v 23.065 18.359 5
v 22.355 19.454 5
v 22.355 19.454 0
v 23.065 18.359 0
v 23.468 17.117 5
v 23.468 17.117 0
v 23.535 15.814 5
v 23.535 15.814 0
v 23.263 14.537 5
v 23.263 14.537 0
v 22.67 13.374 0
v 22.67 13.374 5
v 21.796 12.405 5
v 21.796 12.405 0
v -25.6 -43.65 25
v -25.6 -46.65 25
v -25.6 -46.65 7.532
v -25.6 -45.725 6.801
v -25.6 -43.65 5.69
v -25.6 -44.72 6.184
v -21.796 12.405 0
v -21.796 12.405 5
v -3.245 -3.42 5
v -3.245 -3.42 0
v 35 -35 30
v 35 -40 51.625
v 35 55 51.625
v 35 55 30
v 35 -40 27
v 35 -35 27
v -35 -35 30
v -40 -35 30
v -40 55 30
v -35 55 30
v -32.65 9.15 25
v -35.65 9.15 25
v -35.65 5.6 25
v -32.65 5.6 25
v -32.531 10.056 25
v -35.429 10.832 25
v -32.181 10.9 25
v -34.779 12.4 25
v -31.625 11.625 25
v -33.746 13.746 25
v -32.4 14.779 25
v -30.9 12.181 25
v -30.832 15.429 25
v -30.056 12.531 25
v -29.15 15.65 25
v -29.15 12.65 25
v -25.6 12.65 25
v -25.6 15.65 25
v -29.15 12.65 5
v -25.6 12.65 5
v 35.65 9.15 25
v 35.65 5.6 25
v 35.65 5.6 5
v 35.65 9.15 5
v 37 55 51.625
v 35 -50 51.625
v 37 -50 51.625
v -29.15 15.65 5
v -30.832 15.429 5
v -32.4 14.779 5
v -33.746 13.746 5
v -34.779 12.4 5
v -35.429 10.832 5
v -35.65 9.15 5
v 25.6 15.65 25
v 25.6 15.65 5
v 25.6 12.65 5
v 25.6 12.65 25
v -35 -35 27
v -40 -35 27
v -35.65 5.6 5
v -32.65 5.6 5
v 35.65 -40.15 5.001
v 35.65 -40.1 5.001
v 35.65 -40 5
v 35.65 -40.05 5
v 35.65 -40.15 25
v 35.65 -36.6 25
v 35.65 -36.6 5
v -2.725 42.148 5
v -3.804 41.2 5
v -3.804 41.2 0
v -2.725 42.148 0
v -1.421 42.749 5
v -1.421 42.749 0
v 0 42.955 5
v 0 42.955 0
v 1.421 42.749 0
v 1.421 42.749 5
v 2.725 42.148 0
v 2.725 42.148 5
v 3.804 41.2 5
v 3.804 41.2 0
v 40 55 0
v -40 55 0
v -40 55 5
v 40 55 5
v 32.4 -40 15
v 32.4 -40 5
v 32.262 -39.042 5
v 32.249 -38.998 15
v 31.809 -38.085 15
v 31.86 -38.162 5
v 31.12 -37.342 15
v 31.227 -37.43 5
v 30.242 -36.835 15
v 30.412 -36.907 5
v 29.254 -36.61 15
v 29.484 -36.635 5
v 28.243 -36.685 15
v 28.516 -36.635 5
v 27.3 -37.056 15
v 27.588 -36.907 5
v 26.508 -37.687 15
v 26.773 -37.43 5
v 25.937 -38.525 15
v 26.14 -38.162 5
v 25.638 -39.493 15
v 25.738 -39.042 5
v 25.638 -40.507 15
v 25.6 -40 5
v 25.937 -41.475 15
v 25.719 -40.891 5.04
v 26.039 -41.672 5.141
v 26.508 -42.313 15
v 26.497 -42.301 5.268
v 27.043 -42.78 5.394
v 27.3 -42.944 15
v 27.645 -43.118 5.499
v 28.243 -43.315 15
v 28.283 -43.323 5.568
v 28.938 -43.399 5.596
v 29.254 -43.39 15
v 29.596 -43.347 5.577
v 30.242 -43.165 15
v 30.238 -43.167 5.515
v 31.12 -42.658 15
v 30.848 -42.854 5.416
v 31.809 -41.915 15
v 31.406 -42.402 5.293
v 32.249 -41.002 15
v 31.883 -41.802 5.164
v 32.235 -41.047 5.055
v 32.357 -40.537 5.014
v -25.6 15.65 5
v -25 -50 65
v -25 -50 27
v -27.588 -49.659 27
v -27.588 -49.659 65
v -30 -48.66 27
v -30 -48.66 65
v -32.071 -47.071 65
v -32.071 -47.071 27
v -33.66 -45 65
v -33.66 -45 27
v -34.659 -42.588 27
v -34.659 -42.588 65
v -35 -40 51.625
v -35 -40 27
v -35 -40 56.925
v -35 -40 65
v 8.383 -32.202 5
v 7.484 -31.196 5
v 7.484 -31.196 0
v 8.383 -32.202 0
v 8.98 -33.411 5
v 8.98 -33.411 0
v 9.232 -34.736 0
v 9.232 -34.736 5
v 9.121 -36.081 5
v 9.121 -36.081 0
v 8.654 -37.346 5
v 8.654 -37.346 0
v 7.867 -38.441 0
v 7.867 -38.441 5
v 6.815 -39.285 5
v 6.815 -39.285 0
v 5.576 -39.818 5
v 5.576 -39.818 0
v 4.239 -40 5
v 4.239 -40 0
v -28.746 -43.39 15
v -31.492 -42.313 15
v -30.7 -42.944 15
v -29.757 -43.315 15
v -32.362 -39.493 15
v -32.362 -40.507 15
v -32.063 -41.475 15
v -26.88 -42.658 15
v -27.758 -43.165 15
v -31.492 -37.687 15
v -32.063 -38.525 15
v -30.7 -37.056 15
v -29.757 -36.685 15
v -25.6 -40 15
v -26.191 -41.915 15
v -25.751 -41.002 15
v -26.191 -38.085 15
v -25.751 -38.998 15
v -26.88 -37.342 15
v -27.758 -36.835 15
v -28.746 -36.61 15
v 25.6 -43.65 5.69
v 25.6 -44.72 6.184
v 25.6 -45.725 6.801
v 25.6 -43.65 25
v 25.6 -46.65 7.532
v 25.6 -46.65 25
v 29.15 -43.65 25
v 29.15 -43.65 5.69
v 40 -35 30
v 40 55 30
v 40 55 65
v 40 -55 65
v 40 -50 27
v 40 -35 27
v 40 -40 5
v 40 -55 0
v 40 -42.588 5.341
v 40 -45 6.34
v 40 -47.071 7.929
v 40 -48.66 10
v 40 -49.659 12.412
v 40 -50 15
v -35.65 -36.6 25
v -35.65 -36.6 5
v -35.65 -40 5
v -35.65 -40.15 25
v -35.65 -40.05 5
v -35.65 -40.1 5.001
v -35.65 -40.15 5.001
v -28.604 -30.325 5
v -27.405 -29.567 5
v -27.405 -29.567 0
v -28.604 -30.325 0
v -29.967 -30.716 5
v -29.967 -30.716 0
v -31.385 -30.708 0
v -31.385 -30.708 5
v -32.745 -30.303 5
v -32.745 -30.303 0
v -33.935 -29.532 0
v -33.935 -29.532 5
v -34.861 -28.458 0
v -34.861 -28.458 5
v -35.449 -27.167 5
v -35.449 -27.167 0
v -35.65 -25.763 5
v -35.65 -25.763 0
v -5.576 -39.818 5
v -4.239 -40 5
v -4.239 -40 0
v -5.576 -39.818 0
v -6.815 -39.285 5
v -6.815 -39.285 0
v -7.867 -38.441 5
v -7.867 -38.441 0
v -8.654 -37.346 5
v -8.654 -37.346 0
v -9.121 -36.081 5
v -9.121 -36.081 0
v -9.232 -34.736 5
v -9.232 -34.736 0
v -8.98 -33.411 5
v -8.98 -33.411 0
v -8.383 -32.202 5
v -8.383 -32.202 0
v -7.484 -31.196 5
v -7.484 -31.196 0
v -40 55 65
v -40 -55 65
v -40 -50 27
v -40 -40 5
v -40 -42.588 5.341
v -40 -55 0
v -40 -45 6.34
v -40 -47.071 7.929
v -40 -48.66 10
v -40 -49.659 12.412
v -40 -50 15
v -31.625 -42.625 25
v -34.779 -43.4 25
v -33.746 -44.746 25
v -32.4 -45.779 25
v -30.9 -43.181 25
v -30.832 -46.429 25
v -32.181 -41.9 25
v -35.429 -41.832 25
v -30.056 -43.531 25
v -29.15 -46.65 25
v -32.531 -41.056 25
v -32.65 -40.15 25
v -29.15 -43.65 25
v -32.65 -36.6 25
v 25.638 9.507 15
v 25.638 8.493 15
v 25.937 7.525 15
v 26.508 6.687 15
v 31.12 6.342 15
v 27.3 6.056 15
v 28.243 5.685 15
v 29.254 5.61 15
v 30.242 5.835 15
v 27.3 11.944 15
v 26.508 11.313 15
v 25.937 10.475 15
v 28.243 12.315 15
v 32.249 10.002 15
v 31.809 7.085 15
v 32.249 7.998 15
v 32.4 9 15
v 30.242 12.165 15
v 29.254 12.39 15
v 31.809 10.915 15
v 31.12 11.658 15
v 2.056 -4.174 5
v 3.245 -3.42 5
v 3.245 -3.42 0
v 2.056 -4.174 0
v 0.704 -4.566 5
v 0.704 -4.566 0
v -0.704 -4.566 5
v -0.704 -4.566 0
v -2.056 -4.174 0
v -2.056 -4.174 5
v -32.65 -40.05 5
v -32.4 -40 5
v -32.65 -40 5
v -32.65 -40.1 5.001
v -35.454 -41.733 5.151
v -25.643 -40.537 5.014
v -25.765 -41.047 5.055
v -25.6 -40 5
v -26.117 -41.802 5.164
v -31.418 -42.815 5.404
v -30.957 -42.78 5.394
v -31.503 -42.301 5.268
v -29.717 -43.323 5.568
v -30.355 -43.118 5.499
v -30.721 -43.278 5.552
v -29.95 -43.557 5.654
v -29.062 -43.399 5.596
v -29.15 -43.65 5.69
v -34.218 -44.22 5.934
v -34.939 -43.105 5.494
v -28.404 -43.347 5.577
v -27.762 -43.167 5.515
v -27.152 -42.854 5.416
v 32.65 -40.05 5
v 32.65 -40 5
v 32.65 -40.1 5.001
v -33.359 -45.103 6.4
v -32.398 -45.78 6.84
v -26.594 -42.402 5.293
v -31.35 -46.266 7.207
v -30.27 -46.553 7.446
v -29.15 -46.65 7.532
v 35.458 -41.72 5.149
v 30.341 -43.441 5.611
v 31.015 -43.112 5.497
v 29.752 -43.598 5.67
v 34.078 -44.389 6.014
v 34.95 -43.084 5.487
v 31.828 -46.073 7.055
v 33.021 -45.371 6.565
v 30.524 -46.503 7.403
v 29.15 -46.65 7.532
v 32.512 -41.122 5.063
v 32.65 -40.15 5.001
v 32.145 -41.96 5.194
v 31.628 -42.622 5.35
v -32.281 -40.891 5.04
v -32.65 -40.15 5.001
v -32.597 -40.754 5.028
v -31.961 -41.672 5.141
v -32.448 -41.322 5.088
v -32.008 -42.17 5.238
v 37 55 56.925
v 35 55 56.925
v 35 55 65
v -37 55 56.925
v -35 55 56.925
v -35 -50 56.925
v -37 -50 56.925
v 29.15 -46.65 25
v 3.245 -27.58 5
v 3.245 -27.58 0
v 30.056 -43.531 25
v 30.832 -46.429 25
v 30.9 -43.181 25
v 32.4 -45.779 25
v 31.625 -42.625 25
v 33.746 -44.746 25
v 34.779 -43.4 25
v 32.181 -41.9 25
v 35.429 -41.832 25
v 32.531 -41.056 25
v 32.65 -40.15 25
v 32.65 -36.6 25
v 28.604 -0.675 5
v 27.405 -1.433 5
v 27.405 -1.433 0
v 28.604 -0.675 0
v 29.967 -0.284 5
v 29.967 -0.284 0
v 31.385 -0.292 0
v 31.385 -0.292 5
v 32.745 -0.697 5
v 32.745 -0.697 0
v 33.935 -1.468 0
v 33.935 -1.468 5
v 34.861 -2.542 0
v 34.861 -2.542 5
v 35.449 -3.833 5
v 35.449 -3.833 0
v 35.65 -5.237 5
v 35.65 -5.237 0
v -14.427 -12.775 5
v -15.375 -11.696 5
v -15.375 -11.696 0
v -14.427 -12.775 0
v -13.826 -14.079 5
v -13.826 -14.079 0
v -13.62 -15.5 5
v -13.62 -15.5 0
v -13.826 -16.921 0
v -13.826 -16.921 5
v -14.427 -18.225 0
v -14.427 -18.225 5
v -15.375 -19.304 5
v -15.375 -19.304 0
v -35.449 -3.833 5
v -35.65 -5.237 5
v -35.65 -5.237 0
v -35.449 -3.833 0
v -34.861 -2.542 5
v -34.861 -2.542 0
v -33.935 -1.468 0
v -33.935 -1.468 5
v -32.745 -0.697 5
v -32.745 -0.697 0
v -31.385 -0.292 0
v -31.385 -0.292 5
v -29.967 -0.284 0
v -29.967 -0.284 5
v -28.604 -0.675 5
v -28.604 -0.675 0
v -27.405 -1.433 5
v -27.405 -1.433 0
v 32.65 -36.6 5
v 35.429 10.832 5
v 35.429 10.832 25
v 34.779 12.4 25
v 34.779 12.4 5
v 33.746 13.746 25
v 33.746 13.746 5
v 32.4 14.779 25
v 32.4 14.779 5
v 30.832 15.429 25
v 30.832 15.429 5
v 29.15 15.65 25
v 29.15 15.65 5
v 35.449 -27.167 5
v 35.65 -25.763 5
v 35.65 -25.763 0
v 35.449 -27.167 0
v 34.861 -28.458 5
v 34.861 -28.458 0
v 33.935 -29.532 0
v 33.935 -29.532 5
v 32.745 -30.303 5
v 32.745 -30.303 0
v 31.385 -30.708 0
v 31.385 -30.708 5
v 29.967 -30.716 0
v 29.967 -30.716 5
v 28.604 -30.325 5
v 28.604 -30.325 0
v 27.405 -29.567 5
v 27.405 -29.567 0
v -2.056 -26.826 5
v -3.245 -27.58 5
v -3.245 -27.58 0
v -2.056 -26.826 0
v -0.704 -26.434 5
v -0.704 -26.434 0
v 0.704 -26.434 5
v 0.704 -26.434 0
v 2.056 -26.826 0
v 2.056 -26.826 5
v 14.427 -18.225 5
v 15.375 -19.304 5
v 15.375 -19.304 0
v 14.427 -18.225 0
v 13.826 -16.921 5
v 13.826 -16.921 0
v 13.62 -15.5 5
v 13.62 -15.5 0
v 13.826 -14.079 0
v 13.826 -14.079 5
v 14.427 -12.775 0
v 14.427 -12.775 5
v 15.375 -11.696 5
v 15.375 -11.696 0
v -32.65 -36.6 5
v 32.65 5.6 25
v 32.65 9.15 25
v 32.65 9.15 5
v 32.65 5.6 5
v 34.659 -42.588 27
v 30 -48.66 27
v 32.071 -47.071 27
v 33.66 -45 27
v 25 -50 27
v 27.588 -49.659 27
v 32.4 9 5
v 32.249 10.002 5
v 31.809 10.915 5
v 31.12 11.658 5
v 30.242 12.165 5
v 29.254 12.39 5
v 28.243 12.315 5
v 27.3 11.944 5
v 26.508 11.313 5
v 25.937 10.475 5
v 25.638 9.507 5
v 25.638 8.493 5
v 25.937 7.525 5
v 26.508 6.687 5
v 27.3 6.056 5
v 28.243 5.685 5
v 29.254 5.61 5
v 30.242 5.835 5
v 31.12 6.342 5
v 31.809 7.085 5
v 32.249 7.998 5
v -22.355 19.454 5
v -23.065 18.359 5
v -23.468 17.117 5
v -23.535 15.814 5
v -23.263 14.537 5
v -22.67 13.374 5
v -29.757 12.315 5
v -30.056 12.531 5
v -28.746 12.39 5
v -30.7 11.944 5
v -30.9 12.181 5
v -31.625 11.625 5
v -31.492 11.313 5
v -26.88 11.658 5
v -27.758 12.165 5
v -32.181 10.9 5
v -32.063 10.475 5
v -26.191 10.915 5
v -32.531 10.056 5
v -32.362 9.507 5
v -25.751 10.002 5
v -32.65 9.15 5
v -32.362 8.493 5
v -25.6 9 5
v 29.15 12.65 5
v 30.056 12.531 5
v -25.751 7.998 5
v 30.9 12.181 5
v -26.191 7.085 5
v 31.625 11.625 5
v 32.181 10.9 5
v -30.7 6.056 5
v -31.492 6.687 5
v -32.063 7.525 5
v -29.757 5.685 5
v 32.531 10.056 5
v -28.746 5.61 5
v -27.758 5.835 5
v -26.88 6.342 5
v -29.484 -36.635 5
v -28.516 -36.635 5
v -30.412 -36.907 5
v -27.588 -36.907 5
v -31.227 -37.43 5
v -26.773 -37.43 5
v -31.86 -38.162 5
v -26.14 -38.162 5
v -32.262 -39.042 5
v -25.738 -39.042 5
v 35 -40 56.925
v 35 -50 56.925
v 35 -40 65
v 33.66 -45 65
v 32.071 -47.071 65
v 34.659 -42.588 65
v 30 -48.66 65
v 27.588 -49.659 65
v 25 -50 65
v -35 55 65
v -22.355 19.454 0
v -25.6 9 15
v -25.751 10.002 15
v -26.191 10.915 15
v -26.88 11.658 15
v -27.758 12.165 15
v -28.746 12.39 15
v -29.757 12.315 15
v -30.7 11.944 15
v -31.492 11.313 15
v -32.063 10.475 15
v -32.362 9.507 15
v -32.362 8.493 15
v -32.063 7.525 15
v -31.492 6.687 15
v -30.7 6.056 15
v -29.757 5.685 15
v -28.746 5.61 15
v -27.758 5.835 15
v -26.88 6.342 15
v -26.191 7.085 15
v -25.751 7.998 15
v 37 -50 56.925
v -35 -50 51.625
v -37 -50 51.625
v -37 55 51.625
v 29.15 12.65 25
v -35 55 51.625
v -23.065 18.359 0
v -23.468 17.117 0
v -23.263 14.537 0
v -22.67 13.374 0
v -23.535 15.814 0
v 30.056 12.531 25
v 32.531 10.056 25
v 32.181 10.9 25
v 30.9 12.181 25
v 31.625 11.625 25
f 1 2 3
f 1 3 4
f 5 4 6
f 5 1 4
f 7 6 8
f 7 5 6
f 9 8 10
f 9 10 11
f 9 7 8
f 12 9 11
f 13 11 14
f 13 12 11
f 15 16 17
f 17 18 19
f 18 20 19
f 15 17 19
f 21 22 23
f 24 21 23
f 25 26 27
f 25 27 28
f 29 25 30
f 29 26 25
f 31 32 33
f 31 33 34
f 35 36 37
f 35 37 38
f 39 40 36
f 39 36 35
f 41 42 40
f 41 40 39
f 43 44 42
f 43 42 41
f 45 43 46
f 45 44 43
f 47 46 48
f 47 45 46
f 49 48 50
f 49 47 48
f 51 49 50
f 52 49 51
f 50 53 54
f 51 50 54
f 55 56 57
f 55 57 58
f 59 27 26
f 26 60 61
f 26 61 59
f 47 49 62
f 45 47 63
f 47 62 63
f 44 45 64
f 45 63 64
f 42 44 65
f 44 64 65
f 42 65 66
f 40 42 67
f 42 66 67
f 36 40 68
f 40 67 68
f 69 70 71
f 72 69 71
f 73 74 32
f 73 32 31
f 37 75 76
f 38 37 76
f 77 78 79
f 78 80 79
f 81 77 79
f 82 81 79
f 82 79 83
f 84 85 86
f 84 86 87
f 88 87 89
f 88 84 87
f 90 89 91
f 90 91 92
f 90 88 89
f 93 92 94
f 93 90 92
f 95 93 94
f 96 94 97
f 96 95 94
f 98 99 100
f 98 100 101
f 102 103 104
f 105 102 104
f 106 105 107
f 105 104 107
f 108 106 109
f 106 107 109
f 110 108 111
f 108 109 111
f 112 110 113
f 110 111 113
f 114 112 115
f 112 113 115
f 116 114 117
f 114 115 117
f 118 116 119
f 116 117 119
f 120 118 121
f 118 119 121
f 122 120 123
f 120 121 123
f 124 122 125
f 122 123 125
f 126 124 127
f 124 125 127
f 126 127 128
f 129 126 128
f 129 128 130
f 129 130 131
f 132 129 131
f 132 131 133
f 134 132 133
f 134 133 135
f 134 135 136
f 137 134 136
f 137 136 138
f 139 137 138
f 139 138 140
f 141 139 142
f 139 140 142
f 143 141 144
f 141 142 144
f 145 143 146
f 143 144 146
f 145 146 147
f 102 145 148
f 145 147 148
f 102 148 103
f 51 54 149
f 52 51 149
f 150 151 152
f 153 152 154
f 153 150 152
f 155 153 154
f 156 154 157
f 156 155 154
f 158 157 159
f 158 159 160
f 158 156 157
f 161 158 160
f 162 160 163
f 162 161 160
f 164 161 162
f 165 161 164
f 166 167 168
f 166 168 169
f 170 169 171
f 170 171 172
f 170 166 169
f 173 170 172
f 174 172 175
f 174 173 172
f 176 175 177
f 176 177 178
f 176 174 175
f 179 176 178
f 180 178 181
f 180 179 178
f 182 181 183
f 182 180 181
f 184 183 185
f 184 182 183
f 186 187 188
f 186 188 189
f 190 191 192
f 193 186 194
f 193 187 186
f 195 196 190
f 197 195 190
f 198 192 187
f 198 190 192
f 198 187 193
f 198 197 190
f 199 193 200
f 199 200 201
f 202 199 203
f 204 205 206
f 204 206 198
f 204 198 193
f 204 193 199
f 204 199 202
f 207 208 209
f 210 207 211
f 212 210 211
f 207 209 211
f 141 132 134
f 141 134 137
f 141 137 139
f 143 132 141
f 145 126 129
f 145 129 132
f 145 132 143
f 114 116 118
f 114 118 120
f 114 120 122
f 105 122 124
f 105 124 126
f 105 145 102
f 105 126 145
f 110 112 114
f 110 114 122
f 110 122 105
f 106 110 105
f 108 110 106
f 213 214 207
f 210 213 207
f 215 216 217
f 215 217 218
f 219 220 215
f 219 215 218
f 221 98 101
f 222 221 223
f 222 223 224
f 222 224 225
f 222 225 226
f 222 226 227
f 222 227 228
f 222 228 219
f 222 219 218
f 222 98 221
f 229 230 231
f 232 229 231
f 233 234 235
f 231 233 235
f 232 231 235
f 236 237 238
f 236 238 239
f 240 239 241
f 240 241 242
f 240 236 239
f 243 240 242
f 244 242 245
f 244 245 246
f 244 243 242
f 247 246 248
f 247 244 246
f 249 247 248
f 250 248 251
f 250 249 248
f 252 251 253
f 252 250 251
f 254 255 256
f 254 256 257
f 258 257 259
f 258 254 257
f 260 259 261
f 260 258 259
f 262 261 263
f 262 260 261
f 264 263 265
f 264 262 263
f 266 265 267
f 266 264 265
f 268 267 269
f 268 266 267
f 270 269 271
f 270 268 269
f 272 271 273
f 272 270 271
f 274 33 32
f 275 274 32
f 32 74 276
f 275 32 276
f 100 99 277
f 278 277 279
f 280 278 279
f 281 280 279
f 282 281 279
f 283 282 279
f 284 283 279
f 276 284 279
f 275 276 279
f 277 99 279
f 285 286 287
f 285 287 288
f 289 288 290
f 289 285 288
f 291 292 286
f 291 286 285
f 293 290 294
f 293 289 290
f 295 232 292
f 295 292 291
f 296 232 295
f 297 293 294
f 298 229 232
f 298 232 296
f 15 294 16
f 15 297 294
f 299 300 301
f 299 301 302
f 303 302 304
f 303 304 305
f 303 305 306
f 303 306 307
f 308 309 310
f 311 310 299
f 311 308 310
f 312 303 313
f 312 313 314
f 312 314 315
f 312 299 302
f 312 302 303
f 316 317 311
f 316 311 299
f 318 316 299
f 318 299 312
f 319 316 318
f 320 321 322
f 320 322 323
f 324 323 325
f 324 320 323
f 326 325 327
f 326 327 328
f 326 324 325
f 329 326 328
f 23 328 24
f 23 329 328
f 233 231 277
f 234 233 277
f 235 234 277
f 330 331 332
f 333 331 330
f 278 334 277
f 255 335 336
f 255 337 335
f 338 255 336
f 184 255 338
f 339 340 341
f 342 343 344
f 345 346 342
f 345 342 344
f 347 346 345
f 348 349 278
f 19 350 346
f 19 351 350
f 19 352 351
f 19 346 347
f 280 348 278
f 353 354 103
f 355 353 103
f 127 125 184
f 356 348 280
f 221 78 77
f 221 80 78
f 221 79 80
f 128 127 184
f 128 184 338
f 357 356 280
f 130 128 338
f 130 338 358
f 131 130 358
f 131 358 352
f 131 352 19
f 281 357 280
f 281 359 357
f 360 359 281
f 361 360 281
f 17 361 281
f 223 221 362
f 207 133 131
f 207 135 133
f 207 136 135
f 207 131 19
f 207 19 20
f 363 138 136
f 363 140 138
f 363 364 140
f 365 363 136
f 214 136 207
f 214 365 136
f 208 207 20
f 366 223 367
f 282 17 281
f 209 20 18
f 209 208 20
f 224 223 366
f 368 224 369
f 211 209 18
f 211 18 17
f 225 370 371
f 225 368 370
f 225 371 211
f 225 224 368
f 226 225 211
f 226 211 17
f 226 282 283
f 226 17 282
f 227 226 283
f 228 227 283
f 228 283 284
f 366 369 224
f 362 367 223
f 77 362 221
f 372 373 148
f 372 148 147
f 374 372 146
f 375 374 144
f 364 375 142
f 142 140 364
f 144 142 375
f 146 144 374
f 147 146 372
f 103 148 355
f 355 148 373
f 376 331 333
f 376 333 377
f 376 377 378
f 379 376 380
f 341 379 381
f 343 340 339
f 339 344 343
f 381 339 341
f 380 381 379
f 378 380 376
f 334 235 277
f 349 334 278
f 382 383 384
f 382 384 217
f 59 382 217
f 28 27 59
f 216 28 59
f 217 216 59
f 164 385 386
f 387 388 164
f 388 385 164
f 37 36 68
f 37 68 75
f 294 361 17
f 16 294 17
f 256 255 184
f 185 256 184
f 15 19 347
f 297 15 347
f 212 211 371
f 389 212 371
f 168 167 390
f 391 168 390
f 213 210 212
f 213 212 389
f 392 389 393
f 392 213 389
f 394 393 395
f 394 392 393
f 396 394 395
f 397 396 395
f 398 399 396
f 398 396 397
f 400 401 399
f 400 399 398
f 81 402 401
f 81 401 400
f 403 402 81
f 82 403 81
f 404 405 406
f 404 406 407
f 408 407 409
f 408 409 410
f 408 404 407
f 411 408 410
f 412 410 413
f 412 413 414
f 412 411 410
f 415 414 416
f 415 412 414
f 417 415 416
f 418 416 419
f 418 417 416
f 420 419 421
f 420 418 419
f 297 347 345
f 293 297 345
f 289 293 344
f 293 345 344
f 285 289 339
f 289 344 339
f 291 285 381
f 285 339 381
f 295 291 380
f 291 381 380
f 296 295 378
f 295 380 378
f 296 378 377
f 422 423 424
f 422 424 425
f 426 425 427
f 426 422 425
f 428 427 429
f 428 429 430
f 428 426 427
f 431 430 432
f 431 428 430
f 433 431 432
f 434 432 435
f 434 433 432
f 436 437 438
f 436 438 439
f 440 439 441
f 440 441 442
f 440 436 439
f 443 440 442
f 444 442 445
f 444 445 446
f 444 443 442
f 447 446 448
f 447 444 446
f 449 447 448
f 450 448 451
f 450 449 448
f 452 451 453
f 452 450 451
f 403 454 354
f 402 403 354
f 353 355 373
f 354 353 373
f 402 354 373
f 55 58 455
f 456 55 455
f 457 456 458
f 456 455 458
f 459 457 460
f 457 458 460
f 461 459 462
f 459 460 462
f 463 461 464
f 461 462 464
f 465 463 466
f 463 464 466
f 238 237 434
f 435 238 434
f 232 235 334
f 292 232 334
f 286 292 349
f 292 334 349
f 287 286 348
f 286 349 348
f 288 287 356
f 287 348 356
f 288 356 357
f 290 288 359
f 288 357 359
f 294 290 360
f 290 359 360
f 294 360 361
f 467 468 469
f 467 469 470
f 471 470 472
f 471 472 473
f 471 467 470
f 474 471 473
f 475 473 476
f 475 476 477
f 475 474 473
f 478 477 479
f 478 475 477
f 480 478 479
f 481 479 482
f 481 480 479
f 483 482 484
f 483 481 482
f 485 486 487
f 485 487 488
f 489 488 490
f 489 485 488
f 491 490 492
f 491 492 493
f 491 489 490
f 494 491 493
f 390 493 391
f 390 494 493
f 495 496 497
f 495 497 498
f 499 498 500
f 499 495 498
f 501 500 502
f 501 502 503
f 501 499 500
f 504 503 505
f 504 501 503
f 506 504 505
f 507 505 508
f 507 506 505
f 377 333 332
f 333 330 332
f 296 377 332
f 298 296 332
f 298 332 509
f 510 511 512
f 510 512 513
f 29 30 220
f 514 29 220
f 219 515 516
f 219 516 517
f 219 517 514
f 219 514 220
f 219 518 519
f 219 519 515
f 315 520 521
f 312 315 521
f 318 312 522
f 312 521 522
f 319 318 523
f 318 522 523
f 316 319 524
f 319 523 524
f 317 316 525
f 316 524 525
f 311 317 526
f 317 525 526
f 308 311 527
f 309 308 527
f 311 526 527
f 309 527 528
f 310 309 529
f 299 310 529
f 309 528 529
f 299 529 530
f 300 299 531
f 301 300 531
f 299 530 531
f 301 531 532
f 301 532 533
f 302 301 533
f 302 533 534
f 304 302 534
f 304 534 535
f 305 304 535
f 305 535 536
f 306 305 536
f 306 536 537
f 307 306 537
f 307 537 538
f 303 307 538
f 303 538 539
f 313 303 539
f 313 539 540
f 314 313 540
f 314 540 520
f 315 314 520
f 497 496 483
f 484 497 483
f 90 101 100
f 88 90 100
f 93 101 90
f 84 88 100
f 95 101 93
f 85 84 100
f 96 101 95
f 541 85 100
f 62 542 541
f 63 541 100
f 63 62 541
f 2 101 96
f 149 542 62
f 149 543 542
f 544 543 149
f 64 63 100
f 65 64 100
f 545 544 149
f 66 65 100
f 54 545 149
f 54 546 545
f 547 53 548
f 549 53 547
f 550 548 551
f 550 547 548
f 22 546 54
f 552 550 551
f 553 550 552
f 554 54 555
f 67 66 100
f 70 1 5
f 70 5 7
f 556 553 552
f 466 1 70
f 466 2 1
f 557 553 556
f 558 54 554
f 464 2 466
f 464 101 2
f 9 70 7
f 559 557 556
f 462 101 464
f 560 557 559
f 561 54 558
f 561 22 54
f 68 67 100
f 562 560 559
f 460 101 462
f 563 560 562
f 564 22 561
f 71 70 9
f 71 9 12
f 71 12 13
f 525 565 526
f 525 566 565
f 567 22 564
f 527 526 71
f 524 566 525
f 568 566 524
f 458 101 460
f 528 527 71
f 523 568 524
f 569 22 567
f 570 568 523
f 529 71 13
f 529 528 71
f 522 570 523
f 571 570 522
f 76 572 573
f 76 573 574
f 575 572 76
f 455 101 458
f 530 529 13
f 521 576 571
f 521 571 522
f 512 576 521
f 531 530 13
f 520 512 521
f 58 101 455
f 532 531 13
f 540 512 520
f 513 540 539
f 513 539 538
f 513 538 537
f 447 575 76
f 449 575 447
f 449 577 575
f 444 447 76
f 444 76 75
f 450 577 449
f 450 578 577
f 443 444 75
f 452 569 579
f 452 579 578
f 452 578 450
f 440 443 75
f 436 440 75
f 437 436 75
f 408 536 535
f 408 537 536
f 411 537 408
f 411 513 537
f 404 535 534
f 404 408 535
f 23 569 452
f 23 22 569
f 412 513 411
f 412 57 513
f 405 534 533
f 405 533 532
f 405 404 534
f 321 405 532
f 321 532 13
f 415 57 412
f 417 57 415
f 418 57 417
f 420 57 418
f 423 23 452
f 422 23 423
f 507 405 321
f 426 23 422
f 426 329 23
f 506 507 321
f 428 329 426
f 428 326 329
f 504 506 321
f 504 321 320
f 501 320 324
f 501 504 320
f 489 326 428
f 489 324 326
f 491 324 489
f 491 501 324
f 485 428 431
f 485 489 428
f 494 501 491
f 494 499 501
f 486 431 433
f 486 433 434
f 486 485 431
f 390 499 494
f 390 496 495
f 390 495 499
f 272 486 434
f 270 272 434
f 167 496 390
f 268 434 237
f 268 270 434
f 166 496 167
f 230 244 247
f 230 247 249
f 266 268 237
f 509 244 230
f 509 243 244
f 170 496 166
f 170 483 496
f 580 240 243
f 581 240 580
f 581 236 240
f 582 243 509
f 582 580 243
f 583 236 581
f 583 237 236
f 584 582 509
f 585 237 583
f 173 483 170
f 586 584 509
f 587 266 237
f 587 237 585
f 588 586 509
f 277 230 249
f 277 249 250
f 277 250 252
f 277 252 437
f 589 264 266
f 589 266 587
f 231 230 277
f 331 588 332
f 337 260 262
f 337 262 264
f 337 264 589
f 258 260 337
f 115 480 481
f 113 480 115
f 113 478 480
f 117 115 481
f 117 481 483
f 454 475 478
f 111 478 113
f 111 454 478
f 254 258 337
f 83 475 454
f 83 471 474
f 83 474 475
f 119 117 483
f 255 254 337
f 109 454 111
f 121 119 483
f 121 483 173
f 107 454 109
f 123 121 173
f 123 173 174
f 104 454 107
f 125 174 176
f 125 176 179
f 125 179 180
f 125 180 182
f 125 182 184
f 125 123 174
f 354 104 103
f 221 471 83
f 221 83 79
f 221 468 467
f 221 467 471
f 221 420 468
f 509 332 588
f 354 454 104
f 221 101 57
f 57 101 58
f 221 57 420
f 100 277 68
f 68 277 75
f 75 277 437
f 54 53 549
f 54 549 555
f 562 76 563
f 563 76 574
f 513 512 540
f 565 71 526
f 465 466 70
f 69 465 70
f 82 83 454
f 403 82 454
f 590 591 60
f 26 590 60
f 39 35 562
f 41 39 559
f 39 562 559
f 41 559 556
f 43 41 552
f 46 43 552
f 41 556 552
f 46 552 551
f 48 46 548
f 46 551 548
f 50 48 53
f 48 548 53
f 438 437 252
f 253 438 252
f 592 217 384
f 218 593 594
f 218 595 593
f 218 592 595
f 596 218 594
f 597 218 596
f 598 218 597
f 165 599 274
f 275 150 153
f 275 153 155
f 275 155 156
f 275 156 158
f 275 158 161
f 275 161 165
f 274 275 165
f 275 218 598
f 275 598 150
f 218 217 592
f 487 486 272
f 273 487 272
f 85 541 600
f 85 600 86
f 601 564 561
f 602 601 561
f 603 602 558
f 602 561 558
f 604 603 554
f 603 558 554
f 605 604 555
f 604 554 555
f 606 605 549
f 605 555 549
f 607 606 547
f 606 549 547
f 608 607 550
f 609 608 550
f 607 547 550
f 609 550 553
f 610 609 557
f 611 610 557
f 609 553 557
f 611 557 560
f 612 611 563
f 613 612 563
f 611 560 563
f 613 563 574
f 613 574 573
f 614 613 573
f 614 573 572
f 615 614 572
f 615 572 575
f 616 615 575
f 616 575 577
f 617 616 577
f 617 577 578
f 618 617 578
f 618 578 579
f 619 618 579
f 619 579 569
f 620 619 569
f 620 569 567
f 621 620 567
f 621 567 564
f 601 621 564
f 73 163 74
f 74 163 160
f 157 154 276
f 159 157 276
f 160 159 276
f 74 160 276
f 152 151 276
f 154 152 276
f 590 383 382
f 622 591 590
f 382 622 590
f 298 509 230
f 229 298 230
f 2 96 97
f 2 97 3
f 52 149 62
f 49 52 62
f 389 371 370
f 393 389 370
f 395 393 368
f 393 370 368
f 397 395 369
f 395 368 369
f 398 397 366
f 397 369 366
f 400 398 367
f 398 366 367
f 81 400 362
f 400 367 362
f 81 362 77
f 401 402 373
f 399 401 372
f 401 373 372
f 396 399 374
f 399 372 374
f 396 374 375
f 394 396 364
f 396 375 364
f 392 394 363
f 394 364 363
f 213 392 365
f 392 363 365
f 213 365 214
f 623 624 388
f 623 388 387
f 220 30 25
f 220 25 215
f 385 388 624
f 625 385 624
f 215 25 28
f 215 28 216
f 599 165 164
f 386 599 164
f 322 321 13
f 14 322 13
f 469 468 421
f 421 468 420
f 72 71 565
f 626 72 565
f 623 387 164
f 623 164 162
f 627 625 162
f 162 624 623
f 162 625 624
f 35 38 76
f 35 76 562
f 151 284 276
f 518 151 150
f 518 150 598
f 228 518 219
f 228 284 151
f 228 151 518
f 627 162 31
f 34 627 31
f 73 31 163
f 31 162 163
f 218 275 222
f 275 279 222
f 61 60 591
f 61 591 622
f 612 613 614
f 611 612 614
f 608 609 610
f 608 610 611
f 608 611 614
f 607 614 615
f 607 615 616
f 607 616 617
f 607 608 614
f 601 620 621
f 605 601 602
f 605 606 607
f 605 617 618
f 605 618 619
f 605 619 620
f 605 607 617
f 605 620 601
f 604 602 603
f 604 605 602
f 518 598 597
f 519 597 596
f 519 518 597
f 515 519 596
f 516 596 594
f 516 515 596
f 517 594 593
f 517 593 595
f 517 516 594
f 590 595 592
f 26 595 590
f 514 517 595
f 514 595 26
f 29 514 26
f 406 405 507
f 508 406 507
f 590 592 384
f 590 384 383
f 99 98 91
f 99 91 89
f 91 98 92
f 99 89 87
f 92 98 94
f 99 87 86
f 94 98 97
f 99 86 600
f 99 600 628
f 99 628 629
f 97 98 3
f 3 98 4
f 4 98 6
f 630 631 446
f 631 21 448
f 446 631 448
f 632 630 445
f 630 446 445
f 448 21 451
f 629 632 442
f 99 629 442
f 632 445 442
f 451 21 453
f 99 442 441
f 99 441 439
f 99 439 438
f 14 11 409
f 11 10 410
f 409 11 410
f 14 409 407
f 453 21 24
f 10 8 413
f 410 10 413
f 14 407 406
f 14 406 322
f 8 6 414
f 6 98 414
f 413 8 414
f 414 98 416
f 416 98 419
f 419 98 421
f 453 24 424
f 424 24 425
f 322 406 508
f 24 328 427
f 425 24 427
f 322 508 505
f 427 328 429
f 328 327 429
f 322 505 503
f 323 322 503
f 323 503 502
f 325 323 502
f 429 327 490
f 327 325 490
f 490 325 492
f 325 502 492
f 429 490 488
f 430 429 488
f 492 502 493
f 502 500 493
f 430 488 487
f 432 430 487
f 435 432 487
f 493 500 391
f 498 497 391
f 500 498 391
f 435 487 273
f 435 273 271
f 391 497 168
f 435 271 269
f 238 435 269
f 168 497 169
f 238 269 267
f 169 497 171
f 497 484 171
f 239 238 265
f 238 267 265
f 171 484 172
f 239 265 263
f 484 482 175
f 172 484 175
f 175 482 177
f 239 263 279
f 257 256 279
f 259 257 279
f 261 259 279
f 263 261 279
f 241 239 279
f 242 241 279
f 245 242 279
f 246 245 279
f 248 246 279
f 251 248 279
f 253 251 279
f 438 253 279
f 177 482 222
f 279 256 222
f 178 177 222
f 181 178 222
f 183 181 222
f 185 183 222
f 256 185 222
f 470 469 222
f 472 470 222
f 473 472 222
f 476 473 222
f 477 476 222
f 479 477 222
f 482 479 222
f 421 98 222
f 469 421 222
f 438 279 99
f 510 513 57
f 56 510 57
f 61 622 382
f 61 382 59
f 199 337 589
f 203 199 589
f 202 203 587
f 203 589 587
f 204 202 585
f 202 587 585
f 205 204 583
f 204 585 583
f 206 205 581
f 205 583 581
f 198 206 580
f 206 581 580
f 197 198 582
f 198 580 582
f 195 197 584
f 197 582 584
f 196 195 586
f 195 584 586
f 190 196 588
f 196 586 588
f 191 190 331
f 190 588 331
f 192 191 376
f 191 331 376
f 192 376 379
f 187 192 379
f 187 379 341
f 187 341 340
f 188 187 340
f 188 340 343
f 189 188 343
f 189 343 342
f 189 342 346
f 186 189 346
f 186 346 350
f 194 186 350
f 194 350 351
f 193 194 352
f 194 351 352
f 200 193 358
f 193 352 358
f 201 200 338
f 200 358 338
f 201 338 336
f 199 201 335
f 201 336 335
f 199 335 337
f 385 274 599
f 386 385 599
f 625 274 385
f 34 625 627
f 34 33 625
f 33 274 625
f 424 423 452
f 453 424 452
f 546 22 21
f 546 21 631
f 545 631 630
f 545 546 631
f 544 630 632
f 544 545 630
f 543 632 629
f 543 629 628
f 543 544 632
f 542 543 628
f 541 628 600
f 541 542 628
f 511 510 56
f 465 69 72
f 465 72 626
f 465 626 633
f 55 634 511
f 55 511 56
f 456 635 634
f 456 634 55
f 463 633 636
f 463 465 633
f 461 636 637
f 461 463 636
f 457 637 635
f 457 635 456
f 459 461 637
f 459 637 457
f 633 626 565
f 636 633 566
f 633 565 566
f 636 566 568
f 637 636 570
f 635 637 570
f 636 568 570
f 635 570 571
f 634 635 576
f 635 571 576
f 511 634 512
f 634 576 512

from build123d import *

# Parameters (mm, degrees)
SKETCH1_W           = 80
SKETCH1_H           = 110
BOSS_EXTRUDE1_DEPTH = 5
SKETCH1_3_R         = 3.4
BOSS_EXTRUDE3_DEPTH = 15
BOSS_EXTRUDE4_DEPTH = 25
SKETCH2_W           = 80
SKETCH2_H           = 5
BOSS_EXTRUDE5_DEPTH = 60
SKETCH3_W           = 5
SKETCH3_H           = 38
BOSS_EXTRUDE6_DEPTH = 15
SKETCH4_W           = 5
SKETCH4_H           = 35
BOSS_EXTRUDE7_DEPTH = 90
FILLET1_R           = 10
CUT_EXTRUDE1_START  = -105
SKETCH5_W           = 2
SKETCH5_H           = 5.3
CUT_EXTRUDE1_DEPTH  = 105
CUT_EXTRUDE2_REACH  = 92.692
FILLET2_R           = 5


with BuildPart() as part:
    # Sketch1 → Boss-Extrude1 (new body)
    with BuildSketch(Plane.XY):
        Rectangle(SKETCH1_W, SKETCH1_H)
    extrude(amount=BOSS_EXTRUDE1_DEPTH)

    # Sketch1<3> → Boss-Extrude3 (add)
    with BuildSketch(Plane.XY):
        with Locations((-29, 9)):
            Circle(SKETCH1_3_R)
        with Locations((29, 9)):
            Circle(SKETCH1_3_R)
        with Locations((29, -40)):
            Circle(SKETCH1_3_R)
        with Locations((-29, -40)):
            Circle(SKETCH1_3_R)
    extrude(amount=BOSS_EXTRUDE3_DEPTH)

    # Sketch1<4> → Boss-Extrude4 (add)
    with BuildSketch(Plane.XY):
        with BuildLine():
            Line((-25.6, 15.65), (-29.15, 15.65))
            ThreePointArc((-29.15, 15.65), (-33.746194078, 13.746194078), (-35.65, 9.15))
            Line((-35.65, 9.15), (-35.65, 5.6))
            Line((-35.65, 5.6), (-32.65, 5.6))
            Line((-32.65, 5.6), (-32.65, 9.15))
            ThreePointArc((-32.65, 9.15), (-31.624873734, 11.624873734), (-29.15, 12.65))
            Line((-29.15, 12.65), (-25.6, 12.65))
            Line((-25.6, 12.65), (-25.6, 15.65))
        make_face()
        with BuildLine():
            Line((29.15, 15.65), (25.6, 15.65))
            Line((25.6, 15.65), (25.6, 12.65))
            Line((25.6, 12.65), (29.15, 12.65))
            ThreePointArc((29.15, 12.65), (31.624873734, 11.624873734), (32.65, 9.15))
            Line((32.65, 9.15), (32.65, 5.6))
            Line((32.65, 5.6), (35.65, 5.6))
            Line((35.65, 5.6), (35.65, 9.15))
            ThreePointArc((35.65, 9.15), (33.746194078, 13.746194078), (29.15, 15.65))
        make_face()
        with BuildLine():
            Line((35.65, -40.15), (35.65, -36.6))
            Line((35.65, -36.6), (32.65, -36.6))
            Line((32.65, -36.6), (32.65, -40.15))
            ThreePointArc((32.65, -40.15), (31.624873734, -42.624873734), (29.15, -43.65))
            Line((29.15, -43.65), (25.6, -43.65))
            Line((25.6, -43.65), (25.6, -46.65))
            Line((25.6, -46.65), (29.15, -46.65))
            ThreePointArc((29.15, -46.65), (33.746194078, -44.746194078), (35.65, -40.15))
        make_face()
        with BuildLine():
            Line((-32.65, -36.6), (-35.65, -36.6))
            Line((-35.65, -36.6), (-35.65, -40.15))
            ThreePointArc((-35.65, -40.15), (-33.746194078, -44.746194078), (-29.15, -46.65))
            Line((-29.15, -46.65), (-25.6, -46.65))
            Line((-25.6, -46.65), (-25.6, -43.65))
            Line((-25.6, -43.65), (-29.15, -43.65))
            ThreePointArc((-29.15, -43.65), (-31.624873734, -42.624873734), (-32.65, -40.15))
            Line((-32.65, -40.15), (-32.65, -36.6))
        make_face()
    extrude(amount=BOSS_EXTRUDE4_DEPTH)

    # Sketch2 → Boss-Extrude5 (add)
    with BuildSketch(Plane.XY.offset(5)):
        with Locations((0, -52.5)):
            Rectangle(SKETCH2_W, SKETCH2_H)
    extrude(amount=BOSS_EXTRUDE5_DEPTH)

    # Sketch3 → Boss-Extrude6 (add)
    with BuildSketch(Plane(origin=(0, -50, 0), x_dir=(1, 0, 0), z_dir=(0, 1, 0))):
        with Locations((-37.5, -46)):
            Rectangle(SKETCH3_W, SKETCH3_H)
        with Locations((37.5, -46)):
            Rectangle(SKETCH3_W, SKETCH3_H)
    extrude(amount=BOSS_EXTRUDE6_DEPTH)

    # Sketch4 → Boss-Extrude7 (add)
    with BuildSketch(Plane(origin=(0, -35, 0), x_dir=(1, 0, 0), z_dir=(0, 1, 0))):
        with Locations((-37.5, -47.5)):
            Rectangle(SKETCH4_W, SKETCH4_H)
        with Locations((37.5, -47.5)):
            Rectangle(SKETCH4_W, SKETCH4_H)
    extrude(amount=BOSS_EXTRUDE7_DEPTH)

    # Fillet1
    # the kernel refuses this fillet: 10 mm, written as the material it adds along each edge
    with BuildSketch(Plane(origin=(-35, -50, 65), x_dir=(1, 0, 0), z_dir=(0, 0, -1)), Plane(origin=(35, -50, 27), x_dir=(-1, 0, 0), z_dir=(0, 0, 1))) as fillet1_piece_1:
        with BuildLine():
            CenterArc((FILLET1_R, -FILLET1_R), FILLET1_R, 90, 90)
            Line((0, -FILLET1_R), (0, 0))
            Line((0, 0), (FILLET1_R, 0))
        make_face()
    extrude(amount=38)
    with BuildSketch(Plane(origin=(40, -50, 5), x_dir=(0, 1, 0), z_dir=(-1, 0, 0))) as fillet1_piece_2:
        with BuildLine():
            CenterArc((FILLET1_R, -FILLET1_R), FILLET1_R, 90, 90)
            Line((0, -FILLET1_R), (0, 0))
            Line((0, 0), (FILLET1_R, 0))
        make_face()
    extrude(amount=80)

    # Sketch5 → Cut-Extrude1 (cut)
    with BuildSketch(Plane(origin=(0, 55, 0), x_dir=(1, 0, 0), z_dir=(0, 1, 0)).offset(CUT_EXTRUDE1_START)):
        with Locations((-36, -54.275)):
            Rectangle(SKETCH5_W, SKETCH5_H)
        with Locations((36, -54.275)):
            Rectangle(SKETCH5_W, SKETCH5_H)
    extrude(amount=CUT_EXTRUDE1_DEPTH, mode=Mode.SUBTRACT)

    # Sketch6 → Cut-Extrude2 (cut, up to next)
    with BuildSketch(Plane.XY.offset(5), mode=Mode.PRIVATE) as cut_extrude2_sk1:
        Polygon((0, 45.659569378), (25.6, 15.65), (-25.6, 15.65), align=None)
    cut_extrude2_tool1 = extrude(cut_extrude2_sk1.sketch, amount=-CUT_EXTRUDE2_REACH, mode=Mode.PRIVATE) & part.part
    # Sketch6 → Cut-Extrude2 (cut, up to next)
    with BuildSketch(Plane.XY.offset(5), mode=Mode.PRIVATE) as cut_extrude2_sk2:
        Polygon((-25.6, 15.65), (0, -6.188367347), (25.6, 15.65), align=None)
    cut_extrude2_tool2 = extrude(cut_extrude2_sk2.sketch, amount=-CUT_EXTRUDE2_REACH, mode=Mode.PRIVATE) & part.part
    # Sketch6 → Cut-Extrude2 (cut, up to next)
    with BuildSketch(Plane.XY.offset(5), mode=Mode.PRIVATE) as cut_extrude2_sk3:
        Polygon((-35.65, -36.6), (-10.915550239, -15.5), (-35.65, 5.6), align=None)
    cut_extrude2_tool3 = extrude(cut_extrude2_sk3.sketch, amount=-CUT_EXTRUDE2_REACH, mode=Mode.PRIVATE) & part.part
    # Sketch6 → Cut-Extrude2 (cut, up to next)
    with BuildSketch(Plane.XY.offset(5), mode=Mode.PRIVATE) as cut_extrude2_sk4:
        Polygon((-17.804545455, -40), (17.804545455, -40), (0, -24.811632653), align=None)
    cut_extrude2_tool4 = extrude(cut_extrude2_sk4.sketch, amount=-CUT_EXTRUDE2_REACH, mode=Mode.PRIVATE) & part.part
    # Sketch6 → Cut-Extrude2 (cut, up to next)
    with BuildSketch(Plane.XY.offset(5), mode=Mode.PRIVATE) as cut_extrude2_sk5:
        Polygon((10.915550239, -15.5), (35.65, -36.6), (35.65, 5.6), align=None)
    cut_extrude2_tool5 = extrude(cut_extrude2_sk5.sketch, amount=-CUT_EXTRUDE2_REACH, mode=Mode.PRIVATE) & part.part
    add(cut_extrude2_tool1.solids().sort_by_distance((0, 25.65319, 5))[0], mode=Mode.SUBTRACT)
    add(cut_extrude2_tool2.solids().sort_by_distance((0, 8.370544, 5))[0], mode=Mode.SUBTRACT)
    add(cut_extrude2_tool3.solids().sort_by_distance((-27.405183, -15.5, 5))[0], mode=Mode.SUBTRACT)
    add(cut_extrude2_tool4.solids().sort_by_distance((0, -34.937211, 5))[0], mode=Mode.SUBTRACT)
    add(cut_extrude2_tool5.solids().sort_by_distance((27.405183, -15.5, 5))[0], mode=Mode.SUBTRACT)

    # Fillet2
    # the kernel refuses this fillet: 5 mm, written as the material it adds along each edge
    with BuildSketch(Plane(origin=(17.804545455, -40, 5), x_dir=(-1, 0, 0), z_dir=(0, 0, -1))) as fillet2_piece_1:
        with BuildLine():
            CenterArc((FILLET2_R * 2.71308210373, FILLET2_R), FILLET2_R, 130.466208854, 139.533791146)
            Line((FILLET2_R * 2.06408263048, FILLET2_R * 1.7607888562), (0, 0))
            Line((0, 0), (FILLET2_R * 2.71308210373, 0))
        make_face()
    extrude(amount=5)
    with BuildSketch(Plane(origin=(0, -24.811632653, 5), x_dir=(0.7607888562020934, -0.6489994732499483, 0), z_dir=(0, 0, -1)), Plane(origin=(0, -6.188367347, 5), x_dir=(-0.7607888562020926, 0.6489994732499494, 0), z_dir=(0, 0, -1))) as fillet2_piece_2:
        with BuildLine():
            CenterArc((FILLET2_R * 0.85306122449, FILLET2_R), FILLET2_R, 189.067582292, 80.932417708)
            Line((-FILLET2_R * 0.134441909369, FILLET2_R * 0.842400632557), (0, 0))
            Line((0, 0), (FILLET2_R * 0.85306122449, 0))
        make_face()
    extrude(amount=5)
    with BuildSketch(Plane(origin=(-17.804545455, -40, 5), x_dir=(1, 0, 0), z_dir=(0, 0, -1))) as fillet2_piece_3:
        with BuildLine():
            CenterArc((FILLET2_R * 2.71308210373, -FILLET2_R), FILLET2_R, 90, 139.533791146)
            Line((FILLET2_R * 2.06408263048, -FILLET2_R * 1.7607888562), (0, 0))
            Line((0, 0), (FILLET2_R * 2.71308210373, 0))
        make_face()
    extrude(amount=5)
    with BuildSketch(Plane(origin=(-35.65, 5.6, 5), x_dir=(0, -1, 0), z_dir=(0, 0, -1)), Plane(origin=(35.65, -36.6, 5), x_dir=(0, 1, 0), z_dir=(0, 0, -1))) as fillet2_piece_4:
        with BuildLine():
            CenterArc((FILLET2_R * 2.16748636604, -FILLET2_R), FILLET2_R, 90, 130.466208854)
            Line((FILLET2_R * 1.40669750983, -FILLET2_R * 1.64899947325), (0, 0))
            Line((0, 0), (FILLET2_R * 2.16748636604, 0))
        make_face()
    extrude(amount=5)
    with BuildSketch(Plane(origin=(-10.915550239, -15.5, 5), x_dir=(-0.7607888562020928, -0.6489994732499492, 0), z_dir=(0, 0, -1)), Plane(origin=(10.915550239, -15.5, 5), x_dir=(0.760788856202093, 0.648999473249949, 0), z_dir=(0, 0, -1)), Plane(origin=(0, 45.659569378, 5), x_dir=(0.6489994732499487, -0.7607888562020931, 0), z_dir=(0, 0, -1))) as fillet2_piece_5:
        with BuildLine():
            CenterArc((FILLET2_R * 1.17224880383, FILLET2_R), FILLET2_R, 170.932417708, 99.067582292)
            Line((FILLET2_R * 0.184745669969, FILLET2_R * 1.15759936744), (0, 0))
            Line((0, 0), (FILLET2_R * 1.17224880383, 0))
        make_face()
    extrude(amount=5)
    with BuildSketch(Plane(origin=(-35.65, -36.6, 5), x_dir=(0, 1, 0), z_dir=(0, 0, -1)), Plane(origin=(35.65, 5.6, 5), x_dir=(0, -1, 0), z_dir=(0, 0, -1))) as fillet2_piece_6:
        with BuildLine():
            CenterArc((FILLET2_R * 2.16748636604, FILLET2_R), FILLET2_R, 139.533791146, 130.466208854)
            Line((FILLET2_R * 1.40669750983, FILLET2_R * 1.64899947325), (0, 0))
            Line((0, 0), (FILLET2_R * 2.16748636604, 0))
        make_face()
    extrude(amount=5)
    with BuildSketch(Plane(origin=(25.6, 15.65, 5), x_dir=(-0.6489994732499493, 0.7607888562020927, 0), z_dir=(0, 0, -1))) as fillet2_piece_7:
        with BuildLine():
            CenterArc((FILLET2_R, -FILLET2_R), FILLET2_R, 90, 90)
            Line((0, -FILLET2_R), (0, 0))
            Line((0, 0), (FILLET2_R, 0))
        make_face()
    extrude(amount=5)
    with BuildSketch(Plane(origin=(-25.6, 15.65, 5), x_dir=(0.648999473249949, 0.7607888562020928, 0), z_dir=(0, 0, -1))) as fillet2_piece_8:
        with BuildLine():
            CenterArc((FILLET2_R, FILLET2_R), FILLET2_R, 180, 90)
            Line((0, FILLET2_R), (0, 0))
            Line((0, 0), (FILLET2_R, 0))
        make_face()
    extrude(amount=5)


solid = part.part
